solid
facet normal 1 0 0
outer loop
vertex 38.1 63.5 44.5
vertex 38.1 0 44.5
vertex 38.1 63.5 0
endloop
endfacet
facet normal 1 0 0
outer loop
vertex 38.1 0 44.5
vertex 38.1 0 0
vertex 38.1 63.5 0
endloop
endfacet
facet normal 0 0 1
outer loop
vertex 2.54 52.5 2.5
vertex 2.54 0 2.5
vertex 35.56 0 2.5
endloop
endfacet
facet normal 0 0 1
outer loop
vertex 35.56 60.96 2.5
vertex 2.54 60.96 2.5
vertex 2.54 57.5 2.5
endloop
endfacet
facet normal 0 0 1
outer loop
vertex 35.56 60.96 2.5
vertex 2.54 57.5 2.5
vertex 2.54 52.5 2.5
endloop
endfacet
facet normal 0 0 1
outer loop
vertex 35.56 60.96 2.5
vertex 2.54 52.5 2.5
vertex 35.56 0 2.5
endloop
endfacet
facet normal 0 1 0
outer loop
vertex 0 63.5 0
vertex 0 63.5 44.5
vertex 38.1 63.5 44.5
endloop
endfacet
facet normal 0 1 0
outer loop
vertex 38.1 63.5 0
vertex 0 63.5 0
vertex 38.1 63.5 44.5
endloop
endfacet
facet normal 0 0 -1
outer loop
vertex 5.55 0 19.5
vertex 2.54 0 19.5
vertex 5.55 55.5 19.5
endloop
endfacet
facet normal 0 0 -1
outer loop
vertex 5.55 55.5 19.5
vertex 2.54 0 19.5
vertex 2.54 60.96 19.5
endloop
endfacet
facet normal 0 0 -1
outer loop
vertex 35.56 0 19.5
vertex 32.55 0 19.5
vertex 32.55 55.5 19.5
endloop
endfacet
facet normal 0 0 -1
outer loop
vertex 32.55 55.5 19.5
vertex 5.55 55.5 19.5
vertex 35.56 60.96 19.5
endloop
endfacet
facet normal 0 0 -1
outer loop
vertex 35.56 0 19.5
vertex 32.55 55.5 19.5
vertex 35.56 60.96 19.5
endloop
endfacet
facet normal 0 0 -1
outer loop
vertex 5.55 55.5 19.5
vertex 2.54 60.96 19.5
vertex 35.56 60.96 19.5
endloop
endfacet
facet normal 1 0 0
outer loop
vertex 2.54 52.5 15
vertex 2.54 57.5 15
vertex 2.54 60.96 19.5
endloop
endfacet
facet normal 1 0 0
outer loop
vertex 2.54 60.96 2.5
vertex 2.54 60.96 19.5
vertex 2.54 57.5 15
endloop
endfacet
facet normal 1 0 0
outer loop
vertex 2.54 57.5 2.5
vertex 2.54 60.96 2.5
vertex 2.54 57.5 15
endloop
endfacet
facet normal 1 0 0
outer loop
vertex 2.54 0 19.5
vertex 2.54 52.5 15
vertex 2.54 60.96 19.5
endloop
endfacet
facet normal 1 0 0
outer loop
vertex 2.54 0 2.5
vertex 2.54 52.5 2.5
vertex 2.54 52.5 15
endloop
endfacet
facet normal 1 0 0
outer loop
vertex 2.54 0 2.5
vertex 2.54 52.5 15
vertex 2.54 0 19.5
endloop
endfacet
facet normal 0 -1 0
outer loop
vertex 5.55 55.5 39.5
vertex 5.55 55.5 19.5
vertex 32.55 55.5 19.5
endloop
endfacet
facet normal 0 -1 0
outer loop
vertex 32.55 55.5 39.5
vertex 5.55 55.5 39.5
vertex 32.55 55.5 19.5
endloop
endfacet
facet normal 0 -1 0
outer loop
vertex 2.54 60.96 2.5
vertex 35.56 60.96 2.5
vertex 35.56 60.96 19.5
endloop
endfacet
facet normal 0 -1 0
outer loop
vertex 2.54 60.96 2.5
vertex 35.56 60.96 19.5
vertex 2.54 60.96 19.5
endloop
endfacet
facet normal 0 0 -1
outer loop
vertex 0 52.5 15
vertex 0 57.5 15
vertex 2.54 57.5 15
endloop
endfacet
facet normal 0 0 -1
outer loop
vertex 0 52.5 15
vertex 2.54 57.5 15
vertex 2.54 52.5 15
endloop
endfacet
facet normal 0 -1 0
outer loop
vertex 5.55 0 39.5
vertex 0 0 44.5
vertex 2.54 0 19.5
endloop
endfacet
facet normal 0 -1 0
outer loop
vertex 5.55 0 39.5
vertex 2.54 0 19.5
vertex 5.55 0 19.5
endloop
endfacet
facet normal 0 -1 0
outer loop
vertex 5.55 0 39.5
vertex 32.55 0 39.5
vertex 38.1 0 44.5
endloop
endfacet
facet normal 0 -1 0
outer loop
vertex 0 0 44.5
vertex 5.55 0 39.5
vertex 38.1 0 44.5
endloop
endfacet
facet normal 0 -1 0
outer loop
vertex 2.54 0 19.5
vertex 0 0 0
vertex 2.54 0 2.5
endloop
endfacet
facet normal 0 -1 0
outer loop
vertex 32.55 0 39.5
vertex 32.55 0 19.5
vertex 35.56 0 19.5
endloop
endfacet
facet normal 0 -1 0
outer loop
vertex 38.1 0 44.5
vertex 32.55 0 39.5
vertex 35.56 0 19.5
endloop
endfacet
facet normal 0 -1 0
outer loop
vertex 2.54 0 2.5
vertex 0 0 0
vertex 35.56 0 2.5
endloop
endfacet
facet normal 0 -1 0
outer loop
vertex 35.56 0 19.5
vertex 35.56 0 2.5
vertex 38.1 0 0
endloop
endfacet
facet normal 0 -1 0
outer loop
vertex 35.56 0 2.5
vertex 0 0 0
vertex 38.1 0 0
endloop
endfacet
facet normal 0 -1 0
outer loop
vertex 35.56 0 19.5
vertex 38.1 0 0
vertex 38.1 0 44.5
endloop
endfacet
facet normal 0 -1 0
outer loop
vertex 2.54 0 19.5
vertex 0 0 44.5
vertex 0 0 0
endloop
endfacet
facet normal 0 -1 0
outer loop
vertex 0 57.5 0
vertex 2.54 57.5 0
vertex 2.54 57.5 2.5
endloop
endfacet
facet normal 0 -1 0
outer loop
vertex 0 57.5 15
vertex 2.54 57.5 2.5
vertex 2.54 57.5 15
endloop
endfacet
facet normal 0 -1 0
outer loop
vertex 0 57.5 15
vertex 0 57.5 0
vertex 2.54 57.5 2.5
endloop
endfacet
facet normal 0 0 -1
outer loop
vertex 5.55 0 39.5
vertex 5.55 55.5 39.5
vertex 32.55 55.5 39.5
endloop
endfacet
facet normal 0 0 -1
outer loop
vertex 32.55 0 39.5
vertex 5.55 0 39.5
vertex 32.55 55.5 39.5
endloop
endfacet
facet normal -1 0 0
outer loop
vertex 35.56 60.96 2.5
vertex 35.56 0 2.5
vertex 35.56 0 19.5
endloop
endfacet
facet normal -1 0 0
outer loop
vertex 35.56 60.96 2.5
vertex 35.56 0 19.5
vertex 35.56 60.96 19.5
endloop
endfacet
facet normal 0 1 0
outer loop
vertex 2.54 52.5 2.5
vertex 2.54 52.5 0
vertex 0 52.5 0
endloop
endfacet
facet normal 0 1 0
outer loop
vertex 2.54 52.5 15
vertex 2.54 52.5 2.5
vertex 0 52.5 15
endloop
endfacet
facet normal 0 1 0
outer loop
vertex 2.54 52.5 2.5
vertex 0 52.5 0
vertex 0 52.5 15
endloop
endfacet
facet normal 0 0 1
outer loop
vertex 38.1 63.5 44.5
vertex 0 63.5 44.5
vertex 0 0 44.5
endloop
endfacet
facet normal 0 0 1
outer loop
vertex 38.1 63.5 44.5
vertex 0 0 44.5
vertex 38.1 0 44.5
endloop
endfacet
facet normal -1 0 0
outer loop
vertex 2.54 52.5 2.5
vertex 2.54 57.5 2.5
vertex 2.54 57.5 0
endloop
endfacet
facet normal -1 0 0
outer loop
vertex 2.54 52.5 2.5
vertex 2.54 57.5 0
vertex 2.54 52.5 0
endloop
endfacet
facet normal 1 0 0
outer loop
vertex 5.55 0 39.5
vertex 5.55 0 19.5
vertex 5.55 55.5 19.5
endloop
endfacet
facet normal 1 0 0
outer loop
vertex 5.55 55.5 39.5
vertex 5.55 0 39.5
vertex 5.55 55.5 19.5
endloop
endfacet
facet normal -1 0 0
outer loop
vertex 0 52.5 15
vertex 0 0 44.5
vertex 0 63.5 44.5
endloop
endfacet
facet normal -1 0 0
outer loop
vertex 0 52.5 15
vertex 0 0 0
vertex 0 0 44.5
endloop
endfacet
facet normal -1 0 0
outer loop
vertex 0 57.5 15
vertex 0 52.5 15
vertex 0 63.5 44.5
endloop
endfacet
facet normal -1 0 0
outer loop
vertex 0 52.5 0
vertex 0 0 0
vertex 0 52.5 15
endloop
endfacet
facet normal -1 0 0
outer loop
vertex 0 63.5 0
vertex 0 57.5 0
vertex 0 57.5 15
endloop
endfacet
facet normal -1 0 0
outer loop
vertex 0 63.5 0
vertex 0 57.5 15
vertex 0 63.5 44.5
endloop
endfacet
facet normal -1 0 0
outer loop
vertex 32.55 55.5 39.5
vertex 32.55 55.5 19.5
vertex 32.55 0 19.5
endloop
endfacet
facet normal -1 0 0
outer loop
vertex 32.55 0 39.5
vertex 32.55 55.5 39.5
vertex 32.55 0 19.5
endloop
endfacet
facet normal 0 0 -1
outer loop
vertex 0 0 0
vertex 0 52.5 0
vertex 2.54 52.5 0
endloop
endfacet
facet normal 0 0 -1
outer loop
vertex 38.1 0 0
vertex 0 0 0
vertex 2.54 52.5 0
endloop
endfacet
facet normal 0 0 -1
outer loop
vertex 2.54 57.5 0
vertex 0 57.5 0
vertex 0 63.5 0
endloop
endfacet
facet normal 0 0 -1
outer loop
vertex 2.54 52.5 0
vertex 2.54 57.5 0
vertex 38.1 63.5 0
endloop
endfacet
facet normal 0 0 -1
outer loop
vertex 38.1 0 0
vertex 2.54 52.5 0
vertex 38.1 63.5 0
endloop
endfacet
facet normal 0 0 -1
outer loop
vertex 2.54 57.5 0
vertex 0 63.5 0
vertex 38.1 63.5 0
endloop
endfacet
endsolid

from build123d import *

# Parameters (mm, degrees)
SKETCH_W     = 38.1
SKETCH_H     = 63.5
PAD_DEPTH    = 2.5
PAD001_DEPTH = 17
SKETCH002_W  = 5
SKETCH002_H  = 15
POCKET_DEPTH = 2.54
PAD002_DEPTH = 20
SKETCH004_W  = 38.1
SKETCH004_H  = 63.5
PAD003_DEPTH = 5


with BuildPart() as part:
    # Sketch → Pad (new body)
    with BuildSketch(Plane.XY):
        with Locations((19.05, 31.75)):
            Rectangle(SKETCH_W, SKETCH_H)
    extrude(amount=PAD_DEPTH)

    # Sketch001 (on Face6 of Pad) → Pad001 (join)
    with BuildSketch(Plane.XY.offset(2.5)):
        Polygon((0, 0), (0, 63.5), (38.1, 63.5), (38.1, 0), (35.56, 0), (35.56, 60.96), (2.54, 60.96), (2.54, 0), align=None)
    extrude(amount=PAD001_DEPTH)

    # Sketch002 (on Face8 of Pad001) → Pocket (cut)
    with BuildSketch(Plane(origin=(0, 0, 0), x_dir=(0, -1, 0), z_dir=(-1, 0, 0))):
        with Locations((-55, 7.5)):
            Rectangle(SKETCH002_W, SKETCH002_H)
    extrude(amount=-POCKET_DEPTH, mode=Mode.SUBTRACT)

    # Sketch003 (on Face9 of Pocket) → Pad002 (join)
    with BuildSketch(Plane.XY.offset(19.5)):
        Polygon((0, 0), (5.55, 0), (5.55, 55.5), (32.55, 55.5), (32.55, 0), (38.1, 0), (38.1, 63.5), (0, 63.5), align=None)
    extrude(amount=PAD002_DEPTH)

    # Sketch004 (on Face12 of Pad002) → Pad003 (join)
    with BuildSketch(Plane.XY.offset(39.5)):
        with Locations((19.05, 31.75)):
            Rectangle(SKETCH004_W, SKETCH004_H)
    extrude(amount=PAD003_DEPTH)


solid = part.part
